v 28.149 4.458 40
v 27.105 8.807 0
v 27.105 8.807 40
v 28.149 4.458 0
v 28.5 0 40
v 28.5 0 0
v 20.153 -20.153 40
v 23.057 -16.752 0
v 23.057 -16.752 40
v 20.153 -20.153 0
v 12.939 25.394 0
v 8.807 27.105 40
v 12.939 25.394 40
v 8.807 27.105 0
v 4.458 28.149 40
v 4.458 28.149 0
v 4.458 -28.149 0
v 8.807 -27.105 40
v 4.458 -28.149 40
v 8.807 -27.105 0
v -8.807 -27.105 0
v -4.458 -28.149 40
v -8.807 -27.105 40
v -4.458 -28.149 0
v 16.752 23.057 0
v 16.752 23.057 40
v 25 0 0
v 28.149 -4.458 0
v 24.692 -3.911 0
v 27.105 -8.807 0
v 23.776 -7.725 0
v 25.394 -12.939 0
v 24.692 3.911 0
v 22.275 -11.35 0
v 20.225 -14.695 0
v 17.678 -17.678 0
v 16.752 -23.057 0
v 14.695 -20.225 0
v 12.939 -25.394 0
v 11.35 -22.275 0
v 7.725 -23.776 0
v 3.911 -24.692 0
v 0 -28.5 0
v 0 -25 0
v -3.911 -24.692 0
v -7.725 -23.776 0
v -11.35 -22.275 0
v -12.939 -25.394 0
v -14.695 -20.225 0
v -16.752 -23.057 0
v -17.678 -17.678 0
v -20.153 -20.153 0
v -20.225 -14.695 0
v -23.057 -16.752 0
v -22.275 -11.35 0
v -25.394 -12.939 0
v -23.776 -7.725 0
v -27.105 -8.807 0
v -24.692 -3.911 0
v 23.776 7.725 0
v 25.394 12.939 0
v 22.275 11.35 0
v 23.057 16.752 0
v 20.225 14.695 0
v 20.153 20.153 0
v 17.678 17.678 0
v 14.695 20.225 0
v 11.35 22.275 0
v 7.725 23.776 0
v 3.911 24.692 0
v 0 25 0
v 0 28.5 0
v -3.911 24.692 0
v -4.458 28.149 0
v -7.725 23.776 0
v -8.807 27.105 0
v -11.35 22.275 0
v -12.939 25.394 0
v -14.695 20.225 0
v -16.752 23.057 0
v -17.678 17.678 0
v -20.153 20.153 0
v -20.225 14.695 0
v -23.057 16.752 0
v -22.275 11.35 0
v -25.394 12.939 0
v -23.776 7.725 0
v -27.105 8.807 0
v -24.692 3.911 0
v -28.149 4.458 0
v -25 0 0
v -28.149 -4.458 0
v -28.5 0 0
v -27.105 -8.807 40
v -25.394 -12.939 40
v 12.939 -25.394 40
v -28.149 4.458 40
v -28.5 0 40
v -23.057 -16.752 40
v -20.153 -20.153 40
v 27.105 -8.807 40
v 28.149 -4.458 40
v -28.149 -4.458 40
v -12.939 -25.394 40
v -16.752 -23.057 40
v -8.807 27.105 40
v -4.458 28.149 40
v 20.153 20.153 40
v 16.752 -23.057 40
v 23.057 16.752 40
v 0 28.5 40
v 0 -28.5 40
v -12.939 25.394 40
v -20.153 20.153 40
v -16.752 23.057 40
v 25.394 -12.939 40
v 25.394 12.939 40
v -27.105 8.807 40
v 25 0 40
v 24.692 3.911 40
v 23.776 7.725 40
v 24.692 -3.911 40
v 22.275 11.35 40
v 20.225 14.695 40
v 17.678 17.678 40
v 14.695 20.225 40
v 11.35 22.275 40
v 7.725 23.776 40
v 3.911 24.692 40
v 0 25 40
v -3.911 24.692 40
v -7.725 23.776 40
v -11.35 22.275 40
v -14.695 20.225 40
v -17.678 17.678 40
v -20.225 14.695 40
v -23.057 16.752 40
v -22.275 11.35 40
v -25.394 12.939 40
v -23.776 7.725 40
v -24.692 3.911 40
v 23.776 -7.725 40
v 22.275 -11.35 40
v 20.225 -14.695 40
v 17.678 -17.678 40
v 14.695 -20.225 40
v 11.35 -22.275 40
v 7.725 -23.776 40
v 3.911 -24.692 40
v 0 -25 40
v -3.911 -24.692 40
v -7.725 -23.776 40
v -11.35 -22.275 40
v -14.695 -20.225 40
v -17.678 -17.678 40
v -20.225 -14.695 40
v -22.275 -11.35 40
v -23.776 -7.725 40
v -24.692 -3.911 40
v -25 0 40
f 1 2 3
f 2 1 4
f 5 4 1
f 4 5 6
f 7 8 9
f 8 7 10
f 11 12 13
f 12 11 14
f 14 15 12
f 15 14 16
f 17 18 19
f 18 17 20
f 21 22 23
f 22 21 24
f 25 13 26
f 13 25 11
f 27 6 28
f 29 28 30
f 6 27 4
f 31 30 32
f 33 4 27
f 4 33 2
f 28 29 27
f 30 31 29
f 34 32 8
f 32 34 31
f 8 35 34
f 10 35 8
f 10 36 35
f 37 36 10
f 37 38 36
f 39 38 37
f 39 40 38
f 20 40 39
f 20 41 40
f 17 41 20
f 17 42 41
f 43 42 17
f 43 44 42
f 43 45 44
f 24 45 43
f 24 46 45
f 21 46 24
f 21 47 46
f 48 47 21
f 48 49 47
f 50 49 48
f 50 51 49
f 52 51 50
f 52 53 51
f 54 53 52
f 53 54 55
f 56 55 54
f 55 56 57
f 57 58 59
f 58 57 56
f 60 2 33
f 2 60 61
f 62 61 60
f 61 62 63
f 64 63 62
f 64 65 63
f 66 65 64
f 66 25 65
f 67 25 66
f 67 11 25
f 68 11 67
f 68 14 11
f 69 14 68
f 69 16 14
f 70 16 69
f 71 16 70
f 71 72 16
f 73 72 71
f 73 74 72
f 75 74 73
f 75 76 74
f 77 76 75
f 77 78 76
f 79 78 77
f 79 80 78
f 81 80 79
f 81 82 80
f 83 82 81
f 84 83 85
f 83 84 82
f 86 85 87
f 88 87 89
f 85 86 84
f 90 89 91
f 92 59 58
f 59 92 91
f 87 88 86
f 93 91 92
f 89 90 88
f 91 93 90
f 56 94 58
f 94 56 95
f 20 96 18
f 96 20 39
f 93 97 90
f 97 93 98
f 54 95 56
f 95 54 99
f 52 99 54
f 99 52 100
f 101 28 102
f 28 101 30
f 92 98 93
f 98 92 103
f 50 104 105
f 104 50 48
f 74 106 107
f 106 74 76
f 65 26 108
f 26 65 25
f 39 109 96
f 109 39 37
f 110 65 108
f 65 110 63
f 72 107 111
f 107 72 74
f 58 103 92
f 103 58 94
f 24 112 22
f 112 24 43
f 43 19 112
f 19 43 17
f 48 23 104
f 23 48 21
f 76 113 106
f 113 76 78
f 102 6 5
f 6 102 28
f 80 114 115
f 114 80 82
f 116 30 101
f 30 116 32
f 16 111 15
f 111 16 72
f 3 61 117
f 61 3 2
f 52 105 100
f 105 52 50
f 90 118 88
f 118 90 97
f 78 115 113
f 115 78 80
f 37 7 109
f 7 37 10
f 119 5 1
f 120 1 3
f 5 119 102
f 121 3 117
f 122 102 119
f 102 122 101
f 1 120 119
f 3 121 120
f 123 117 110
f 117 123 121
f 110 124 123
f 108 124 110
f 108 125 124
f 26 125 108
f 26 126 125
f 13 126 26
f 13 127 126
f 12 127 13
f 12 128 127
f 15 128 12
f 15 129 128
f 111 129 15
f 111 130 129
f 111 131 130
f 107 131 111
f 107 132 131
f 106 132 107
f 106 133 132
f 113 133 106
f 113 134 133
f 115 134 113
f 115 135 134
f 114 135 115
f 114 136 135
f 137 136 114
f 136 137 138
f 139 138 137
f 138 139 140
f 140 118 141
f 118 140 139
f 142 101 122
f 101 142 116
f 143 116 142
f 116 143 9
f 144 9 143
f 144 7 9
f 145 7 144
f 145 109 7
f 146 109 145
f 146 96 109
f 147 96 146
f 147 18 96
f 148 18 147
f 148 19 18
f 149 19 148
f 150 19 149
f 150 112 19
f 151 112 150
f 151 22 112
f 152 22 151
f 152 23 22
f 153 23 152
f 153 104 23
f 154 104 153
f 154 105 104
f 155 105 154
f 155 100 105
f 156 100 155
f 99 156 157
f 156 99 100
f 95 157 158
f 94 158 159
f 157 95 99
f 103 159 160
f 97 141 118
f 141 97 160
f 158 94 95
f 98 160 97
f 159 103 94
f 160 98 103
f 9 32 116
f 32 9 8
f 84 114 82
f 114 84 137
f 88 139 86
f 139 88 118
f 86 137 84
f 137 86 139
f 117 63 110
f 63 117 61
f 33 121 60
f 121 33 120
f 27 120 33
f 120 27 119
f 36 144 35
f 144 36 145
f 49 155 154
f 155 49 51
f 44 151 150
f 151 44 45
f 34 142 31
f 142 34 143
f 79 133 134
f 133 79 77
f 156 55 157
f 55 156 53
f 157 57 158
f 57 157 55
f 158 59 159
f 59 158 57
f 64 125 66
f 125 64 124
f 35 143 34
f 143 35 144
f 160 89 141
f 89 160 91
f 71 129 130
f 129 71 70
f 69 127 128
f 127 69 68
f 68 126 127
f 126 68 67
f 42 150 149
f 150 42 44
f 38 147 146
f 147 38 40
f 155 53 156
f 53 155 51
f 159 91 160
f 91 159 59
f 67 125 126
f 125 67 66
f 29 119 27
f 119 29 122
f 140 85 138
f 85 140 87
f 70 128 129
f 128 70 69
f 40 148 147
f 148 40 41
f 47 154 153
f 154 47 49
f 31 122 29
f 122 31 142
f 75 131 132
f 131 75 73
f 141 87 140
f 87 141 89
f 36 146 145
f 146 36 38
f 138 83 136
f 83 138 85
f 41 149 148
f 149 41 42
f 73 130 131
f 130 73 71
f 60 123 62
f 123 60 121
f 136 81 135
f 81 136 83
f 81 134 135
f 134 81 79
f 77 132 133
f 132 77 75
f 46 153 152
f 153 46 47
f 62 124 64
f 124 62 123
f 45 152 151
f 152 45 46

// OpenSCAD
$fn=40;

difference () {

	linear_extrude(height=40)
		circle(d=57);
	linear_extrude(height=40)
		circle(d=50);
	}
